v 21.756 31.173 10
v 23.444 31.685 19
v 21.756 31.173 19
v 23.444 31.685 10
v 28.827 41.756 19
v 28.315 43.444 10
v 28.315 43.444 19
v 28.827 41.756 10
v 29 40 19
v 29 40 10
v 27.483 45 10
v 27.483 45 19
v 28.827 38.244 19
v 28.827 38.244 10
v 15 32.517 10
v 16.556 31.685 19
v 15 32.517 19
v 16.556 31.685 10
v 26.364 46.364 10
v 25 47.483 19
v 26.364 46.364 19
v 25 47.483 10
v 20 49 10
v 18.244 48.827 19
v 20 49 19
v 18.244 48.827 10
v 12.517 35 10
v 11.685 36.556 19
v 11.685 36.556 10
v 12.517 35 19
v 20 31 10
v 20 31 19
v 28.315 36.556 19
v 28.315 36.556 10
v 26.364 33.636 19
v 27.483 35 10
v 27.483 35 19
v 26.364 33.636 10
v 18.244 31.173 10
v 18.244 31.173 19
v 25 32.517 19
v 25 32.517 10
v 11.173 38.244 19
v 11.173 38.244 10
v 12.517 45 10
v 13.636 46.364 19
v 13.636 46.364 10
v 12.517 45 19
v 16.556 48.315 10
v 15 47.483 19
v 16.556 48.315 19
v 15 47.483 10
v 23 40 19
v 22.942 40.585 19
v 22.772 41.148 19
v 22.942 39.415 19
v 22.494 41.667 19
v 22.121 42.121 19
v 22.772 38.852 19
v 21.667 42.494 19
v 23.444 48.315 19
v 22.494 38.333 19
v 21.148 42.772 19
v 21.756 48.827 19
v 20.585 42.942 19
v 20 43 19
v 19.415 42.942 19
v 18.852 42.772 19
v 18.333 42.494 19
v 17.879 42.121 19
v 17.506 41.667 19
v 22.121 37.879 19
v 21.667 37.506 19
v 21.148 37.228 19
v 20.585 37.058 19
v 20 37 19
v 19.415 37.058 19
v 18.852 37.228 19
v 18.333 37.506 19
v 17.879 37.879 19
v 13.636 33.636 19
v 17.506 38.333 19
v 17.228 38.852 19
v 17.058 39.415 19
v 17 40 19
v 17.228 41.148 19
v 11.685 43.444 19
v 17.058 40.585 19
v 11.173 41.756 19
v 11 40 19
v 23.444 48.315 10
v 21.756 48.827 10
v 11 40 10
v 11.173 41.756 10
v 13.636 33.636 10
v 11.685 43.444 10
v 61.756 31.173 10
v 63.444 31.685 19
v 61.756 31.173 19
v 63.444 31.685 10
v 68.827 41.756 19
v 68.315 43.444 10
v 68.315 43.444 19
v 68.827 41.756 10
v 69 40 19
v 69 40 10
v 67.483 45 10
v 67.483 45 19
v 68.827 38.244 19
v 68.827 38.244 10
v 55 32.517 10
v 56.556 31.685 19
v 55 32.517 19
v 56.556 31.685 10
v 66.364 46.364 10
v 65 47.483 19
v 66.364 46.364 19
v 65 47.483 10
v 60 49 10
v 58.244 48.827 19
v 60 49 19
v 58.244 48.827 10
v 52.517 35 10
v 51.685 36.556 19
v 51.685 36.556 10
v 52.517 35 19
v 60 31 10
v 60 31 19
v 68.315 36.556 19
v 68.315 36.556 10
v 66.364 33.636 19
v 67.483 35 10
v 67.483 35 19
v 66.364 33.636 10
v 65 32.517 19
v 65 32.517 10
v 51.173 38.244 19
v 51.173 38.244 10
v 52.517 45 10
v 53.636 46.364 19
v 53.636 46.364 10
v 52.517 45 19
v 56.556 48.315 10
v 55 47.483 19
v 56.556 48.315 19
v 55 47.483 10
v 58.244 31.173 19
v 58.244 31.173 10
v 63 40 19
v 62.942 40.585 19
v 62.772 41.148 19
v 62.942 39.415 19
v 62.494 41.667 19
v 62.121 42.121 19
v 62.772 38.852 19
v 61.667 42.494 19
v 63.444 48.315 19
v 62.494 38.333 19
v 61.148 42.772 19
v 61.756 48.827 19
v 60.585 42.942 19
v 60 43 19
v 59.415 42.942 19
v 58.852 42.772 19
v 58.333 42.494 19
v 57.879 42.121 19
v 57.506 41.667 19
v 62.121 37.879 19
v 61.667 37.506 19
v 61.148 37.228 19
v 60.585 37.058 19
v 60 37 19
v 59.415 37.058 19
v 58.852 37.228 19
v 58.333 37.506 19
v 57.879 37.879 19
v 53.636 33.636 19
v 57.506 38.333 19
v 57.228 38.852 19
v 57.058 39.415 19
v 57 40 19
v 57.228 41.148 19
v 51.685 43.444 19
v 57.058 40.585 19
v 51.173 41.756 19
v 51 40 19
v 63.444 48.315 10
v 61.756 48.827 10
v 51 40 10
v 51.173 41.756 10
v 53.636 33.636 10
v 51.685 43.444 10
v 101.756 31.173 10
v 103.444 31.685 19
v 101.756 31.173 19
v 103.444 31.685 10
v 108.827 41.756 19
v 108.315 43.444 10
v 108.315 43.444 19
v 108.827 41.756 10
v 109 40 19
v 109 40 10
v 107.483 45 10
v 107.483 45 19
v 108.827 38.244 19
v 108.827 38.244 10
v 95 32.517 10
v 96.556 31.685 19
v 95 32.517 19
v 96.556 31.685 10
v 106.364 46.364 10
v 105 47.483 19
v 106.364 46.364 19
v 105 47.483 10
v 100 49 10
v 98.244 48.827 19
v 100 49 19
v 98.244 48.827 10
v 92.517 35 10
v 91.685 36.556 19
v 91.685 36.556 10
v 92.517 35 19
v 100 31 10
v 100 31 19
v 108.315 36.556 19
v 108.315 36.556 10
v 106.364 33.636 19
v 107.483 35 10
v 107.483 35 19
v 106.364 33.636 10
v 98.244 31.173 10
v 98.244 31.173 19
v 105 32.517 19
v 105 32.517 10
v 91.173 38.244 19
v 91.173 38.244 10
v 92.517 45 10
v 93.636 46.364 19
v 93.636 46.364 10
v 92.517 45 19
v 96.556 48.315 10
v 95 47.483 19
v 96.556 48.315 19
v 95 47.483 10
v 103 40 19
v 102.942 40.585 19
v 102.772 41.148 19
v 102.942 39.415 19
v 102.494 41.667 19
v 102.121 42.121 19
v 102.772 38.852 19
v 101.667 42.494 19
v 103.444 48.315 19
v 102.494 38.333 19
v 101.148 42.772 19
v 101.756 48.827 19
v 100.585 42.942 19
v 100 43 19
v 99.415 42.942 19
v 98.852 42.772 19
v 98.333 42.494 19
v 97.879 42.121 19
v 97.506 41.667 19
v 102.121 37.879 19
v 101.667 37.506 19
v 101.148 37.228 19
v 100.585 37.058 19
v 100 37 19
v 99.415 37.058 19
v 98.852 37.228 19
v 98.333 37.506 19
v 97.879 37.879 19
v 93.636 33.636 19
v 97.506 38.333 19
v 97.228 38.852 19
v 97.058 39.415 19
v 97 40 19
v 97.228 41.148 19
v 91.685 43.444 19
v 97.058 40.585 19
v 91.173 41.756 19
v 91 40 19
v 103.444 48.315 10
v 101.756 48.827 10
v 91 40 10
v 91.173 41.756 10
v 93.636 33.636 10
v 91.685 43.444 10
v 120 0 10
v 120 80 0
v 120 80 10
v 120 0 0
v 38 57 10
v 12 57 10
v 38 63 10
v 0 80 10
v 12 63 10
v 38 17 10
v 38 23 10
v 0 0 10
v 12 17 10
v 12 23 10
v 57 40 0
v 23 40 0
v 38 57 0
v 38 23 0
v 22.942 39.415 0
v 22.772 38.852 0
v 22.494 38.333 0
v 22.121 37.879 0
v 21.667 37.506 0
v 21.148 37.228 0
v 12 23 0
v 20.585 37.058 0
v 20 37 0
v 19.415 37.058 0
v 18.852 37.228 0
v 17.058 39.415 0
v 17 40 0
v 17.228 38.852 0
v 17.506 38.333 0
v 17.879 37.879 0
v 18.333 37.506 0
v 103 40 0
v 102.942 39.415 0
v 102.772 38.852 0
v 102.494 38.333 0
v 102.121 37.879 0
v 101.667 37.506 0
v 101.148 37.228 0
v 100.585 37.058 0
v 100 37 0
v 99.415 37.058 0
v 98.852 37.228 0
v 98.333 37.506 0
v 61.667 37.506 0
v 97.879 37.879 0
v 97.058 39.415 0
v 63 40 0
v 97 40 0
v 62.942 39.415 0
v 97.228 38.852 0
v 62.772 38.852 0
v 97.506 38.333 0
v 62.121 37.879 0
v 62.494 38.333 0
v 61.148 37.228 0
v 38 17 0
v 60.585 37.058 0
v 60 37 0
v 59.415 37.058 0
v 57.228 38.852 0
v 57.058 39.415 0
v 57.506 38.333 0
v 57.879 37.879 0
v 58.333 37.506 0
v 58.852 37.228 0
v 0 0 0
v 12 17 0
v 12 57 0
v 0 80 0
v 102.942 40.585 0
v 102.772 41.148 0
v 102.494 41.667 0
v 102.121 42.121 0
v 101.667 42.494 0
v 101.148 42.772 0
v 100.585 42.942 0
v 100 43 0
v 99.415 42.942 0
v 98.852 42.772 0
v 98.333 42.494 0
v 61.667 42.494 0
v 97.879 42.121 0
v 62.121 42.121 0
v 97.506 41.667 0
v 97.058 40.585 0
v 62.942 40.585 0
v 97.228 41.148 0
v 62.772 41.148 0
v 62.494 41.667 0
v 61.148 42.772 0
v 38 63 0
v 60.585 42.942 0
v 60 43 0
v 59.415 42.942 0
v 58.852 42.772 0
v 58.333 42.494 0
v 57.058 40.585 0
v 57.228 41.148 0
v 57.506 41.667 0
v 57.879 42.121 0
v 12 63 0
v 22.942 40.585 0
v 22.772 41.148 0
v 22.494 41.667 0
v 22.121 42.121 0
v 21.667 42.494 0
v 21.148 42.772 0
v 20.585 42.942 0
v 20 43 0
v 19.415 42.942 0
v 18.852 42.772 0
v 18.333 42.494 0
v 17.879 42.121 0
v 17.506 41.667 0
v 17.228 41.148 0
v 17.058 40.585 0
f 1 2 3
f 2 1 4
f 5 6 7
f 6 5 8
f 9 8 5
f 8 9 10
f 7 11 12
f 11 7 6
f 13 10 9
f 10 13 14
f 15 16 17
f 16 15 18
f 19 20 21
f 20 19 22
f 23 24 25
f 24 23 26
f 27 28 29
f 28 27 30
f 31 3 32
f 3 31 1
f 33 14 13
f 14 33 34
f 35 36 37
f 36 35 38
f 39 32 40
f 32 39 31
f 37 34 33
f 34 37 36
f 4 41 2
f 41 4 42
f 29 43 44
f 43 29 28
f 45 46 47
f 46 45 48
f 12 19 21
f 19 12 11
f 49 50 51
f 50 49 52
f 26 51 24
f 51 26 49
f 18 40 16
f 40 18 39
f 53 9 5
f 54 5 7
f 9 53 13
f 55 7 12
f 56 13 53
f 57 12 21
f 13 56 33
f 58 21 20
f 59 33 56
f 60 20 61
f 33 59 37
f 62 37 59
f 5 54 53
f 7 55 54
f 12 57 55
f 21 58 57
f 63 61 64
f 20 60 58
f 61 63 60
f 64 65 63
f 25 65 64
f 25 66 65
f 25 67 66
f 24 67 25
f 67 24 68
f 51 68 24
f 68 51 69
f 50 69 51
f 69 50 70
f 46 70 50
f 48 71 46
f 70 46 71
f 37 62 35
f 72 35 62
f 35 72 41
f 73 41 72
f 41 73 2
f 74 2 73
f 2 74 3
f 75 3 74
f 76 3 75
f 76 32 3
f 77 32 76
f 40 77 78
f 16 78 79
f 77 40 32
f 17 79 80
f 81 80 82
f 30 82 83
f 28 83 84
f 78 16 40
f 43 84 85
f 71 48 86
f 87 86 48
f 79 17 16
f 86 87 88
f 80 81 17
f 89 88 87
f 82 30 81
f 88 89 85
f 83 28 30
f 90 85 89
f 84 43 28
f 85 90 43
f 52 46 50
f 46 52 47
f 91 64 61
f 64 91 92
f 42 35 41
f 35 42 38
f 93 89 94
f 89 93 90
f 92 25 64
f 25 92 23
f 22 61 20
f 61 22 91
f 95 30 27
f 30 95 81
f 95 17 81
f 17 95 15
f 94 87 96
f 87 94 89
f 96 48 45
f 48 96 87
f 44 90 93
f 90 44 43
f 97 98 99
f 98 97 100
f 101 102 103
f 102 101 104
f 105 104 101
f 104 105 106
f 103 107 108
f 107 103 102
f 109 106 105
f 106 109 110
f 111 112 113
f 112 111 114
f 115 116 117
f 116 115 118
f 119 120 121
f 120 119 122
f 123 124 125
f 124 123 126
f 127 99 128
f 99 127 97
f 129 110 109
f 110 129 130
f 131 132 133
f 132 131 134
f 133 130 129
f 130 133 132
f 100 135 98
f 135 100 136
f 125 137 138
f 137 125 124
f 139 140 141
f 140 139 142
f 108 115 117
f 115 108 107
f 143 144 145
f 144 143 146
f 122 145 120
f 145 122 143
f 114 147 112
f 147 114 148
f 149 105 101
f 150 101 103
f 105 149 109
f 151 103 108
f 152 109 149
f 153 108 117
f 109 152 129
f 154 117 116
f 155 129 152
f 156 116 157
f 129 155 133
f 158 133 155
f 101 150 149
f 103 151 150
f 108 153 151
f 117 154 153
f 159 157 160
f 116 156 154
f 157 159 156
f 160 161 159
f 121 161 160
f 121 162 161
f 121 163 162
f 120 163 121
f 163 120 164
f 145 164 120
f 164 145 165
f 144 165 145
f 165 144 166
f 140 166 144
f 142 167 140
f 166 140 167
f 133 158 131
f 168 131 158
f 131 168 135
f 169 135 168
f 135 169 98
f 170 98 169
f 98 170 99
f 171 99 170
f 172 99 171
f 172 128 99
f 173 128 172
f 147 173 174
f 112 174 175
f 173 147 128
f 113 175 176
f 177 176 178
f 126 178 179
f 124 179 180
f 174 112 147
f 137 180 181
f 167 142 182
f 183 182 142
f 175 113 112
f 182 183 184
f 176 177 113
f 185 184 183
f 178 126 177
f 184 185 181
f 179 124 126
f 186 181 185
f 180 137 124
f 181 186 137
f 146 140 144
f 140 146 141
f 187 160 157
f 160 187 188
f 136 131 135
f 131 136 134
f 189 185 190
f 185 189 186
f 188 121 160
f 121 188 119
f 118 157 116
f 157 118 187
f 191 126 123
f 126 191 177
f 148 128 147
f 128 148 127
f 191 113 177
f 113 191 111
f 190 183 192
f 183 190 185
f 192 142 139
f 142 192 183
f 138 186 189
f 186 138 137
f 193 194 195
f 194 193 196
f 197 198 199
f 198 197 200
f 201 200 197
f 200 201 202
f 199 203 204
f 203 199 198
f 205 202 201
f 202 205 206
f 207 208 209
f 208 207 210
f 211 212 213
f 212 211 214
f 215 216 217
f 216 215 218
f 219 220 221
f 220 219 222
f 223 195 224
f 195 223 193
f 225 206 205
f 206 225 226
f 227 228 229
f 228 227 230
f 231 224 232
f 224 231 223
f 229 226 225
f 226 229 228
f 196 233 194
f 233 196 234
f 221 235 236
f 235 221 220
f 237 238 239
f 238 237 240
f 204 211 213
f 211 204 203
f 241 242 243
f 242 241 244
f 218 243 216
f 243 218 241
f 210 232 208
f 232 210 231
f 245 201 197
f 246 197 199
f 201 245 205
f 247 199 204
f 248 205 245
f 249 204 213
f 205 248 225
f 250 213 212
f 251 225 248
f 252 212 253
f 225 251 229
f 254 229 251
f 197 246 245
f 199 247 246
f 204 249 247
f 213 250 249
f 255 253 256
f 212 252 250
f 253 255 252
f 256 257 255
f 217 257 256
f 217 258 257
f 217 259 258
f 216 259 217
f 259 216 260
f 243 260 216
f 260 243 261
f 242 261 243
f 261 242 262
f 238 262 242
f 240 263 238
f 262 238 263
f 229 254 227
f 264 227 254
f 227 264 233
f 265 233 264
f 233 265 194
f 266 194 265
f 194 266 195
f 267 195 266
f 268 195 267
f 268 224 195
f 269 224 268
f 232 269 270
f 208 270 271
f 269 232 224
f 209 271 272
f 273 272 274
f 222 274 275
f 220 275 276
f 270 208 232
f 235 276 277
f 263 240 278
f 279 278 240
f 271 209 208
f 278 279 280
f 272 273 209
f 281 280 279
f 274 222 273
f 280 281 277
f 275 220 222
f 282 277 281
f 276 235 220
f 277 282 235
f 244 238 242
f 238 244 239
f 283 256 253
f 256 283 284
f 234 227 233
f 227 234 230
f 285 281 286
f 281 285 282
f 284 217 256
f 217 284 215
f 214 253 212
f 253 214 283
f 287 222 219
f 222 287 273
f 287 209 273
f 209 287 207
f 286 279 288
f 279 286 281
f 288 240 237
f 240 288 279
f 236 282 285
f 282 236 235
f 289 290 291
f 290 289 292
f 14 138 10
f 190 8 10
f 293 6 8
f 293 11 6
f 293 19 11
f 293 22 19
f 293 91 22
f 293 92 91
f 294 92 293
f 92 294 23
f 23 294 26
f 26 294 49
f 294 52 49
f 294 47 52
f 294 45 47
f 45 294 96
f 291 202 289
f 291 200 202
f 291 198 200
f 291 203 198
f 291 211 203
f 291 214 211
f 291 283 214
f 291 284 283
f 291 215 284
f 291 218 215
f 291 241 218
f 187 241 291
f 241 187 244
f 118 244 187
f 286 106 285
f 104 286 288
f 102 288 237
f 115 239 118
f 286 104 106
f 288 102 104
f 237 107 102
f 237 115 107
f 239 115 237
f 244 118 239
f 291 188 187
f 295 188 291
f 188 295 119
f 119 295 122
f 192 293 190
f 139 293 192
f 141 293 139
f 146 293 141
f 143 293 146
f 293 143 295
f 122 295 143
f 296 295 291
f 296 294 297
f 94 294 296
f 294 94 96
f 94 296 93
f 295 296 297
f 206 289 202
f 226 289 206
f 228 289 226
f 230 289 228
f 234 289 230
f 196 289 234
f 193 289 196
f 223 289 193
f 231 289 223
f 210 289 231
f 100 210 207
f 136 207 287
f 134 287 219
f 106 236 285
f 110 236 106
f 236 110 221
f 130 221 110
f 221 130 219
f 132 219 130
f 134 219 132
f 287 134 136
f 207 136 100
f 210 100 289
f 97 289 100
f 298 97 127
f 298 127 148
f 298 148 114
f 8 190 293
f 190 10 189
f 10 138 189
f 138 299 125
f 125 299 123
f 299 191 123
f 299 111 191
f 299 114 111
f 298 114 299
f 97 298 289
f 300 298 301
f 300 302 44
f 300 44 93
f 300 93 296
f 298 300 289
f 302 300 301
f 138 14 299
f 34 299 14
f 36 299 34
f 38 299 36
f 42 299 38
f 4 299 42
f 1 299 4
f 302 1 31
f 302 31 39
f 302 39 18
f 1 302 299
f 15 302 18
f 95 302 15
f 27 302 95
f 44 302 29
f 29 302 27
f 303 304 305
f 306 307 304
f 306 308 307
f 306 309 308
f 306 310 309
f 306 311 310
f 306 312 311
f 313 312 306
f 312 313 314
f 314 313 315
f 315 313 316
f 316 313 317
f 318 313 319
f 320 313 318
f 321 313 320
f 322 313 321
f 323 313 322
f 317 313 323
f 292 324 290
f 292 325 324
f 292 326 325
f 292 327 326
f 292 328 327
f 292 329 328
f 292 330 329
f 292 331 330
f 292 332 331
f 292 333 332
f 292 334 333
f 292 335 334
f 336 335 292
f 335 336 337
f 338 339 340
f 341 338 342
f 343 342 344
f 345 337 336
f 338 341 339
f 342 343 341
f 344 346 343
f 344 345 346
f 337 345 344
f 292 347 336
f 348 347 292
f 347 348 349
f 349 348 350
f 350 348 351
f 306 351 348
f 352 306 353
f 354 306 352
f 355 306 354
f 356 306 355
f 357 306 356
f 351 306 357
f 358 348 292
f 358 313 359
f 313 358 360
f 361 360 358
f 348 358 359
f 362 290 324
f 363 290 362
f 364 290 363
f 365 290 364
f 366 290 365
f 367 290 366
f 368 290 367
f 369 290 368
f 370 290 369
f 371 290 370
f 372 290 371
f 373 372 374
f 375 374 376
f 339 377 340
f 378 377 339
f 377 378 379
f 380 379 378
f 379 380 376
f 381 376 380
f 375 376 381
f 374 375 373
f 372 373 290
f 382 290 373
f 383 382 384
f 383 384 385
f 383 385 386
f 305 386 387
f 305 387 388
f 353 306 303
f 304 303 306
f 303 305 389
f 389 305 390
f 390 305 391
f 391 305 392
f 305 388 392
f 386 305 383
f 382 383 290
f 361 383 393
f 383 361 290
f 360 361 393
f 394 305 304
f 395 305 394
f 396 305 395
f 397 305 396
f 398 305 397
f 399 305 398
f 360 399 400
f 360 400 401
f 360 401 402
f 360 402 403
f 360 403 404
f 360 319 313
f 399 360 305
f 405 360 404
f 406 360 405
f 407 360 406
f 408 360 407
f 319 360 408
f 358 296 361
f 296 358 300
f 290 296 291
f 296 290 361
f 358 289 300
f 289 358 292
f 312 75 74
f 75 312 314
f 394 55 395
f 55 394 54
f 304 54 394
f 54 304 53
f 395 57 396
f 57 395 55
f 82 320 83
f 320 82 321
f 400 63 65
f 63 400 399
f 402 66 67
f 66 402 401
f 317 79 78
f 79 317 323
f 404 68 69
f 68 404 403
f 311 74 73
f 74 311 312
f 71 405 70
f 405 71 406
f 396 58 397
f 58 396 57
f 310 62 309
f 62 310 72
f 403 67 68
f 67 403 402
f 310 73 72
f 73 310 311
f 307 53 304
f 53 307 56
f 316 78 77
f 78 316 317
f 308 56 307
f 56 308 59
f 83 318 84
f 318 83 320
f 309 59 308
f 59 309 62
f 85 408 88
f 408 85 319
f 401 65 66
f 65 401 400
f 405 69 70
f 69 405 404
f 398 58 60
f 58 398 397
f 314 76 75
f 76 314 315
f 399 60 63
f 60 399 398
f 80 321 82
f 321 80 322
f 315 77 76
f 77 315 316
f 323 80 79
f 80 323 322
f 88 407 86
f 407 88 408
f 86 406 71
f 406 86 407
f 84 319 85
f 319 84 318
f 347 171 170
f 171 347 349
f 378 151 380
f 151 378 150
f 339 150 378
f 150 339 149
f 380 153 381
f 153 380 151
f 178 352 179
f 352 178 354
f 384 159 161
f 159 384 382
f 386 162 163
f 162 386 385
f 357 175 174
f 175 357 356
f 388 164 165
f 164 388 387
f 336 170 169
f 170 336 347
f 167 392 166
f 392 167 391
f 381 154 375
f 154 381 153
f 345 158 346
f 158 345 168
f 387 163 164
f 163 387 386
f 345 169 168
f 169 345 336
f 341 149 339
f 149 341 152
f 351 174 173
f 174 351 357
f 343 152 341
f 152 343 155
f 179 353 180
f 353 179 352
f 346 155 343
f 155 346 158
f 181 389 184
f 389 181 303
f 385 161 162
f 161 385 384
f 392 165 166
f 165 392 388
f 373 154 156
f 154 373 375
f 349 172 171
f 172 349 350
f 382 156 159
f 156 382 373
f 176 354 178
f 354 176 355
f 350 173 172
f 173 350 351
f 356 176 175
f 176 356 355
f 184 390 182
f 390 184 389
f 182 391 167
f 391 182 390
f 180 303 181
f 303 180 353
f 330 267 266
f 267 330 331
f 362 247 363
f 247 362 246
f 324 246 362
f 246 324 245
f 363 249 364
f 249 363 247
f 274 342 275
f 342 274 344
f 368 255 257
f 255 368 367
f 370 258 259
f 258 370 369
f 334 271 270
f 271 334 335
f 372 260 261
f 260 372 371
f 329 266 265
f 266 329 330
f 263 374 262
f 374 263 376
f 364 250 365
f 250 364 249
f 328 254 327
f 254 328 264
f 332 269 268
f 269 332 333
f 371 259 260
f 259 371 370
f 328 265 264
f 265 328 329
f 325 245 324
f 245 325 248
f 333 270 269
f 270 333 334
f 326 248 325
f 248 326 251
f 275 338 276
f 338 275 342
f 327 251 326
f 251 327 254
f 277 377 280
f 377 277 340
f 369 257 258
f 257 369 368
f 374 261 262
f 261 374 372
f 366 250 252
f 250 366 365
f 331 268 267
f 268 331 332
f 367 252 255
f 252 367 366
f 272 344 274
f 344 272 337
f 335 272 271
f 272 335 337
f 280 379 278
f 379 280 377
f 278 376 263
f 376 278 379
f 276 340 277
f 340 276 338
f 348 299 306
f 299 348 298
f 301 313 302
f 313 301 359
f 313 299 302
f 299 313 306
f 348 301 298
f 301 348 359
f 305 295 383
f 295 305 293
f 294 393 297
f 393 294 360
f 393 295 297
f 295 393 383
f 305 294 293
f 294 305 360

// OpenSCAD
$fn = 32;

// ----------------------------------------------------------------------
// Drill jig: three_boss_slot jig
// ----------------------------------------------------------------------

// --- parameters (mm) ---
plate_l = 120;            // plate length, X
plate_w = 80;             // plate width, Y
plate_t = 10;             // plate thickness
boss_d = 18;              // guide boss diameter
boss_h = 10;              // boss height above the plate
guide_d = 6;              // guide hole diameter
boss_pitch = 40;          // boss pitch
slot_w = 6;               // clamp slot width
slot_l = 26;              // clamp slot length
slot_x = 12;              // slot start X

n_boss = 3;  // guide bosses
boss_x0 = (plate_l - (n_boss - 1) * boss_pitch) / 2;  // first boss X
boss_top = plate_t - 1 + boss_h;  // boss crown height
total_h = boss_top;  // overall height

difference() {
  union() {
  cube([plate_l, plate_w, plate_t]);
  for (i = [0 : n_boss - 1])
    translate([boss_x0 + i * boss_pitch, plate_w / 2, plate_t - 1])
      cylinder(h = boss_h, d = boss_d);
  }
  for (i = [0 : n_boss - 1])
    translate([boss_x0 + i * boss_pitch, plate_w / 2, -1])
      cylinder(h = plate_t + boss_h, d = guide_d);
  for (cy = [plate_w * 0.25, plate_w * 0.75])
    translate([slot_x, cy - slot_w / 2, -1])
      cube([slot_l, slot_w, plate_t + 2]);
}
